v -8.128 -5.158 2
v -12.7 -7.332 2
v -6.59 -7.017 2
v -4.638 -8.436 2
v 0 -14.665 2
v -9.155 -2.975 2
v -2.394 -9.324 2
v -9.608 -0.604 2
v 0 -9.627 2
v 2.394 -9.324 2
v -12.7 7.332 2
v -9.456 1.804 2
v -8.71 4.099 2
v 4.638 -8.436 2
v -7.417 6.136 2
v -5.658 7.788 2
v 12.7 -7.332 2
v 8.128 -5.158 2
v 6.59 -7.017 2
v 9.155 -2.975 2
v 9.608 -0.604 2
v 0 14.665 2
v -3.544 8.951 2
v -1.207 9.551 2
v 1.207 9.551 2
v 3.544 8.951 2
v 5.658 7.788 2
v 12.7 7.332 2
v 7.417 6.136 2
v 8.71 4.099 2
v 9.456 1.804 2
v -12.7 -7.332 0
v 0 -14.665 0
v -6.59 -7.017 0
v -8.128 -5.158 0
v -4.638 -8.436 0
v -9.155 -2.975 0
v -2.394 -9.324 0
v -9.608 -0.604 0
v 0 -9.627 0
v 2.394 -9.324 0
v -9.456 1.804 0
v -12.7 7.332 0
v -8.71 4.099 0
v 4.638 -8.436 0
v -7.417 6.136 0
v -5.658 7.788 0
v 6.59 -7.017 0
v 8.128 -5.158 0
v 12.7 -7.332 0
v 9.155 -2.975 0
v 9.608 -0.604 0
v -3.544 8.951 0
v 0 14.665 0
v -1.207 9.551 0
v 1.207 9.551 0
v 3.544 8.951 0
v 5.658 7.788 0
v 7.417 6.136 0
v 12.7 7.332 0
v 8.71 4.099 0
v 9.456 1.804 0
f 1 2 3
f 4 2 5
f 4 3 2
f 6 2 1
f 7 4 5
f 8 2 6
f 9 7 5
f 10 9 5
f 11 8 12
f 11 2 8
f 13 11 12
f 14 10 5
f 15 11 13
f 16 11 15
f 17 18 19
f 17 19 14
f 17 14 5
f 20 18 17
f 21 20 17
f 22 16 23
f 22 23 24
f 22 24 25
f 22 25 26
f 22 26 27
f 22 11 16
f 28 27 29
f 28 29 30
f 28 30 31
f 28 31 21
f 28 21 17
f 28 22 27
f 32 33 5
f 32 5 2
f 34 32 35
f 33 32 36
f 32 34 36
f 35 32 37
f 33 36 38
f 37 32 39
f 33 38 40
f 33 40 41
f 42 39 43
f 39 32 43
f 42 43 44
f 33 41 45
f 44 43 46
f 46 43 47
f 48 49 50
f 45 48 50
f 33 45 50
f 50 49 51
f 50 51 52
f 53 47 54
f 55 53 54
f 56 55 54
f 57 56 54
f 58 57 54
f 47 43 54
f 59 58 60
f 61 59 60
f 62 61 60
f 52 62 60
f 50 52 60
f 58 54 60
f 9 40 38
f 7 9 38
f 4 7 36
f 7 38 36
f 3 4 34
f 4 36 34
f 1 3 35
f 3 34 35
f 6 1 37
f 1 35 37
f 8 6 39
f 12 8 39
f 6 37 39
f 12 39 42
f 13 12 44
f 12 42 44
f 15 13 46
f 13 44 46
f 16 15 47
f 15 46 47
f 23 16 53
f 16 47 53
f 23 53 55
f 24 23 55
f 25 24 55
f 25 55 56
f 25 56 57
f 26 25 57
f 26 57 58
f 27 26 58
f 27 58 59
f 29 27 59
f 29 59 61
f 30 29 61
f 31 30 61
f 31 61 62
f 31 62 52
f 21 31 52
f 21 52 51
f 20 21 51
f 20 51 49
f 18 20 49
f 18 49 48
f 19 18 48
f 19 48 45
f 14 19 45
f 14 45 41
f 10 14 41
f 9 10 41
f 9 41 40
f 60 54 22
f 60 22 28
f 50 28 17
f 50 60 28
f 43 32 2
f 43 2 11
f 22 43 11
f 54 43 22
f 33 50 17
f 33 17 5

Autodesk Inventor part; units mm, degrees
ref_plane "YZ Plane" through (0, 0, 0) normal (1, 0, 0) x (0, 1, 0)
ref_plane "XZ Plane" through (0, 0, 0) normal (0, 1, 0) x (-1, 0, 0)
ref_plane "XY Plane" through (0, 0, 0) normal (0, 0, 1) x (1, 0, 0)
sketch "Sketch1" plane through (0, 0, 0) normal (0, 0, 1) x (1, 0, 0)
  line L0 (0, 14.6647) -> (12.7, 7.3323)
  line L1 (12.7, 7.3323) -> (12.7, -7.3323)
  line L2 (12.7, -7.3323) -> (0, -14.6647)
  line L3 (0, -14.6647) -> (-12.7, -7.3323)
  line L4 (-12.7, -7.3323) -> (-12.7, 7.3323)
  line L5 (-12.7, 7.3323) -> (0, 14.6647)
  point P0 (0, 0)
  point P1 (0, 0)
  dimension "d0" = 25.4
extrude "Extrusion1" add sketch "Sketch1" along normal blind 2
sketch "Sketch2" plane through (0, 0, 2) normal (0, 0, 1) x (1, 0, 0)
  point P0 (0, 0)
hole "Hole1" at (0, 0, 2) direction (0, 0, -1) diameter 19.2532 end through all thread size "13/16-20 UNEF" class "2B" standard "ANSI Unified Screw Threads"
properties part number "ETHERNET NUT"
